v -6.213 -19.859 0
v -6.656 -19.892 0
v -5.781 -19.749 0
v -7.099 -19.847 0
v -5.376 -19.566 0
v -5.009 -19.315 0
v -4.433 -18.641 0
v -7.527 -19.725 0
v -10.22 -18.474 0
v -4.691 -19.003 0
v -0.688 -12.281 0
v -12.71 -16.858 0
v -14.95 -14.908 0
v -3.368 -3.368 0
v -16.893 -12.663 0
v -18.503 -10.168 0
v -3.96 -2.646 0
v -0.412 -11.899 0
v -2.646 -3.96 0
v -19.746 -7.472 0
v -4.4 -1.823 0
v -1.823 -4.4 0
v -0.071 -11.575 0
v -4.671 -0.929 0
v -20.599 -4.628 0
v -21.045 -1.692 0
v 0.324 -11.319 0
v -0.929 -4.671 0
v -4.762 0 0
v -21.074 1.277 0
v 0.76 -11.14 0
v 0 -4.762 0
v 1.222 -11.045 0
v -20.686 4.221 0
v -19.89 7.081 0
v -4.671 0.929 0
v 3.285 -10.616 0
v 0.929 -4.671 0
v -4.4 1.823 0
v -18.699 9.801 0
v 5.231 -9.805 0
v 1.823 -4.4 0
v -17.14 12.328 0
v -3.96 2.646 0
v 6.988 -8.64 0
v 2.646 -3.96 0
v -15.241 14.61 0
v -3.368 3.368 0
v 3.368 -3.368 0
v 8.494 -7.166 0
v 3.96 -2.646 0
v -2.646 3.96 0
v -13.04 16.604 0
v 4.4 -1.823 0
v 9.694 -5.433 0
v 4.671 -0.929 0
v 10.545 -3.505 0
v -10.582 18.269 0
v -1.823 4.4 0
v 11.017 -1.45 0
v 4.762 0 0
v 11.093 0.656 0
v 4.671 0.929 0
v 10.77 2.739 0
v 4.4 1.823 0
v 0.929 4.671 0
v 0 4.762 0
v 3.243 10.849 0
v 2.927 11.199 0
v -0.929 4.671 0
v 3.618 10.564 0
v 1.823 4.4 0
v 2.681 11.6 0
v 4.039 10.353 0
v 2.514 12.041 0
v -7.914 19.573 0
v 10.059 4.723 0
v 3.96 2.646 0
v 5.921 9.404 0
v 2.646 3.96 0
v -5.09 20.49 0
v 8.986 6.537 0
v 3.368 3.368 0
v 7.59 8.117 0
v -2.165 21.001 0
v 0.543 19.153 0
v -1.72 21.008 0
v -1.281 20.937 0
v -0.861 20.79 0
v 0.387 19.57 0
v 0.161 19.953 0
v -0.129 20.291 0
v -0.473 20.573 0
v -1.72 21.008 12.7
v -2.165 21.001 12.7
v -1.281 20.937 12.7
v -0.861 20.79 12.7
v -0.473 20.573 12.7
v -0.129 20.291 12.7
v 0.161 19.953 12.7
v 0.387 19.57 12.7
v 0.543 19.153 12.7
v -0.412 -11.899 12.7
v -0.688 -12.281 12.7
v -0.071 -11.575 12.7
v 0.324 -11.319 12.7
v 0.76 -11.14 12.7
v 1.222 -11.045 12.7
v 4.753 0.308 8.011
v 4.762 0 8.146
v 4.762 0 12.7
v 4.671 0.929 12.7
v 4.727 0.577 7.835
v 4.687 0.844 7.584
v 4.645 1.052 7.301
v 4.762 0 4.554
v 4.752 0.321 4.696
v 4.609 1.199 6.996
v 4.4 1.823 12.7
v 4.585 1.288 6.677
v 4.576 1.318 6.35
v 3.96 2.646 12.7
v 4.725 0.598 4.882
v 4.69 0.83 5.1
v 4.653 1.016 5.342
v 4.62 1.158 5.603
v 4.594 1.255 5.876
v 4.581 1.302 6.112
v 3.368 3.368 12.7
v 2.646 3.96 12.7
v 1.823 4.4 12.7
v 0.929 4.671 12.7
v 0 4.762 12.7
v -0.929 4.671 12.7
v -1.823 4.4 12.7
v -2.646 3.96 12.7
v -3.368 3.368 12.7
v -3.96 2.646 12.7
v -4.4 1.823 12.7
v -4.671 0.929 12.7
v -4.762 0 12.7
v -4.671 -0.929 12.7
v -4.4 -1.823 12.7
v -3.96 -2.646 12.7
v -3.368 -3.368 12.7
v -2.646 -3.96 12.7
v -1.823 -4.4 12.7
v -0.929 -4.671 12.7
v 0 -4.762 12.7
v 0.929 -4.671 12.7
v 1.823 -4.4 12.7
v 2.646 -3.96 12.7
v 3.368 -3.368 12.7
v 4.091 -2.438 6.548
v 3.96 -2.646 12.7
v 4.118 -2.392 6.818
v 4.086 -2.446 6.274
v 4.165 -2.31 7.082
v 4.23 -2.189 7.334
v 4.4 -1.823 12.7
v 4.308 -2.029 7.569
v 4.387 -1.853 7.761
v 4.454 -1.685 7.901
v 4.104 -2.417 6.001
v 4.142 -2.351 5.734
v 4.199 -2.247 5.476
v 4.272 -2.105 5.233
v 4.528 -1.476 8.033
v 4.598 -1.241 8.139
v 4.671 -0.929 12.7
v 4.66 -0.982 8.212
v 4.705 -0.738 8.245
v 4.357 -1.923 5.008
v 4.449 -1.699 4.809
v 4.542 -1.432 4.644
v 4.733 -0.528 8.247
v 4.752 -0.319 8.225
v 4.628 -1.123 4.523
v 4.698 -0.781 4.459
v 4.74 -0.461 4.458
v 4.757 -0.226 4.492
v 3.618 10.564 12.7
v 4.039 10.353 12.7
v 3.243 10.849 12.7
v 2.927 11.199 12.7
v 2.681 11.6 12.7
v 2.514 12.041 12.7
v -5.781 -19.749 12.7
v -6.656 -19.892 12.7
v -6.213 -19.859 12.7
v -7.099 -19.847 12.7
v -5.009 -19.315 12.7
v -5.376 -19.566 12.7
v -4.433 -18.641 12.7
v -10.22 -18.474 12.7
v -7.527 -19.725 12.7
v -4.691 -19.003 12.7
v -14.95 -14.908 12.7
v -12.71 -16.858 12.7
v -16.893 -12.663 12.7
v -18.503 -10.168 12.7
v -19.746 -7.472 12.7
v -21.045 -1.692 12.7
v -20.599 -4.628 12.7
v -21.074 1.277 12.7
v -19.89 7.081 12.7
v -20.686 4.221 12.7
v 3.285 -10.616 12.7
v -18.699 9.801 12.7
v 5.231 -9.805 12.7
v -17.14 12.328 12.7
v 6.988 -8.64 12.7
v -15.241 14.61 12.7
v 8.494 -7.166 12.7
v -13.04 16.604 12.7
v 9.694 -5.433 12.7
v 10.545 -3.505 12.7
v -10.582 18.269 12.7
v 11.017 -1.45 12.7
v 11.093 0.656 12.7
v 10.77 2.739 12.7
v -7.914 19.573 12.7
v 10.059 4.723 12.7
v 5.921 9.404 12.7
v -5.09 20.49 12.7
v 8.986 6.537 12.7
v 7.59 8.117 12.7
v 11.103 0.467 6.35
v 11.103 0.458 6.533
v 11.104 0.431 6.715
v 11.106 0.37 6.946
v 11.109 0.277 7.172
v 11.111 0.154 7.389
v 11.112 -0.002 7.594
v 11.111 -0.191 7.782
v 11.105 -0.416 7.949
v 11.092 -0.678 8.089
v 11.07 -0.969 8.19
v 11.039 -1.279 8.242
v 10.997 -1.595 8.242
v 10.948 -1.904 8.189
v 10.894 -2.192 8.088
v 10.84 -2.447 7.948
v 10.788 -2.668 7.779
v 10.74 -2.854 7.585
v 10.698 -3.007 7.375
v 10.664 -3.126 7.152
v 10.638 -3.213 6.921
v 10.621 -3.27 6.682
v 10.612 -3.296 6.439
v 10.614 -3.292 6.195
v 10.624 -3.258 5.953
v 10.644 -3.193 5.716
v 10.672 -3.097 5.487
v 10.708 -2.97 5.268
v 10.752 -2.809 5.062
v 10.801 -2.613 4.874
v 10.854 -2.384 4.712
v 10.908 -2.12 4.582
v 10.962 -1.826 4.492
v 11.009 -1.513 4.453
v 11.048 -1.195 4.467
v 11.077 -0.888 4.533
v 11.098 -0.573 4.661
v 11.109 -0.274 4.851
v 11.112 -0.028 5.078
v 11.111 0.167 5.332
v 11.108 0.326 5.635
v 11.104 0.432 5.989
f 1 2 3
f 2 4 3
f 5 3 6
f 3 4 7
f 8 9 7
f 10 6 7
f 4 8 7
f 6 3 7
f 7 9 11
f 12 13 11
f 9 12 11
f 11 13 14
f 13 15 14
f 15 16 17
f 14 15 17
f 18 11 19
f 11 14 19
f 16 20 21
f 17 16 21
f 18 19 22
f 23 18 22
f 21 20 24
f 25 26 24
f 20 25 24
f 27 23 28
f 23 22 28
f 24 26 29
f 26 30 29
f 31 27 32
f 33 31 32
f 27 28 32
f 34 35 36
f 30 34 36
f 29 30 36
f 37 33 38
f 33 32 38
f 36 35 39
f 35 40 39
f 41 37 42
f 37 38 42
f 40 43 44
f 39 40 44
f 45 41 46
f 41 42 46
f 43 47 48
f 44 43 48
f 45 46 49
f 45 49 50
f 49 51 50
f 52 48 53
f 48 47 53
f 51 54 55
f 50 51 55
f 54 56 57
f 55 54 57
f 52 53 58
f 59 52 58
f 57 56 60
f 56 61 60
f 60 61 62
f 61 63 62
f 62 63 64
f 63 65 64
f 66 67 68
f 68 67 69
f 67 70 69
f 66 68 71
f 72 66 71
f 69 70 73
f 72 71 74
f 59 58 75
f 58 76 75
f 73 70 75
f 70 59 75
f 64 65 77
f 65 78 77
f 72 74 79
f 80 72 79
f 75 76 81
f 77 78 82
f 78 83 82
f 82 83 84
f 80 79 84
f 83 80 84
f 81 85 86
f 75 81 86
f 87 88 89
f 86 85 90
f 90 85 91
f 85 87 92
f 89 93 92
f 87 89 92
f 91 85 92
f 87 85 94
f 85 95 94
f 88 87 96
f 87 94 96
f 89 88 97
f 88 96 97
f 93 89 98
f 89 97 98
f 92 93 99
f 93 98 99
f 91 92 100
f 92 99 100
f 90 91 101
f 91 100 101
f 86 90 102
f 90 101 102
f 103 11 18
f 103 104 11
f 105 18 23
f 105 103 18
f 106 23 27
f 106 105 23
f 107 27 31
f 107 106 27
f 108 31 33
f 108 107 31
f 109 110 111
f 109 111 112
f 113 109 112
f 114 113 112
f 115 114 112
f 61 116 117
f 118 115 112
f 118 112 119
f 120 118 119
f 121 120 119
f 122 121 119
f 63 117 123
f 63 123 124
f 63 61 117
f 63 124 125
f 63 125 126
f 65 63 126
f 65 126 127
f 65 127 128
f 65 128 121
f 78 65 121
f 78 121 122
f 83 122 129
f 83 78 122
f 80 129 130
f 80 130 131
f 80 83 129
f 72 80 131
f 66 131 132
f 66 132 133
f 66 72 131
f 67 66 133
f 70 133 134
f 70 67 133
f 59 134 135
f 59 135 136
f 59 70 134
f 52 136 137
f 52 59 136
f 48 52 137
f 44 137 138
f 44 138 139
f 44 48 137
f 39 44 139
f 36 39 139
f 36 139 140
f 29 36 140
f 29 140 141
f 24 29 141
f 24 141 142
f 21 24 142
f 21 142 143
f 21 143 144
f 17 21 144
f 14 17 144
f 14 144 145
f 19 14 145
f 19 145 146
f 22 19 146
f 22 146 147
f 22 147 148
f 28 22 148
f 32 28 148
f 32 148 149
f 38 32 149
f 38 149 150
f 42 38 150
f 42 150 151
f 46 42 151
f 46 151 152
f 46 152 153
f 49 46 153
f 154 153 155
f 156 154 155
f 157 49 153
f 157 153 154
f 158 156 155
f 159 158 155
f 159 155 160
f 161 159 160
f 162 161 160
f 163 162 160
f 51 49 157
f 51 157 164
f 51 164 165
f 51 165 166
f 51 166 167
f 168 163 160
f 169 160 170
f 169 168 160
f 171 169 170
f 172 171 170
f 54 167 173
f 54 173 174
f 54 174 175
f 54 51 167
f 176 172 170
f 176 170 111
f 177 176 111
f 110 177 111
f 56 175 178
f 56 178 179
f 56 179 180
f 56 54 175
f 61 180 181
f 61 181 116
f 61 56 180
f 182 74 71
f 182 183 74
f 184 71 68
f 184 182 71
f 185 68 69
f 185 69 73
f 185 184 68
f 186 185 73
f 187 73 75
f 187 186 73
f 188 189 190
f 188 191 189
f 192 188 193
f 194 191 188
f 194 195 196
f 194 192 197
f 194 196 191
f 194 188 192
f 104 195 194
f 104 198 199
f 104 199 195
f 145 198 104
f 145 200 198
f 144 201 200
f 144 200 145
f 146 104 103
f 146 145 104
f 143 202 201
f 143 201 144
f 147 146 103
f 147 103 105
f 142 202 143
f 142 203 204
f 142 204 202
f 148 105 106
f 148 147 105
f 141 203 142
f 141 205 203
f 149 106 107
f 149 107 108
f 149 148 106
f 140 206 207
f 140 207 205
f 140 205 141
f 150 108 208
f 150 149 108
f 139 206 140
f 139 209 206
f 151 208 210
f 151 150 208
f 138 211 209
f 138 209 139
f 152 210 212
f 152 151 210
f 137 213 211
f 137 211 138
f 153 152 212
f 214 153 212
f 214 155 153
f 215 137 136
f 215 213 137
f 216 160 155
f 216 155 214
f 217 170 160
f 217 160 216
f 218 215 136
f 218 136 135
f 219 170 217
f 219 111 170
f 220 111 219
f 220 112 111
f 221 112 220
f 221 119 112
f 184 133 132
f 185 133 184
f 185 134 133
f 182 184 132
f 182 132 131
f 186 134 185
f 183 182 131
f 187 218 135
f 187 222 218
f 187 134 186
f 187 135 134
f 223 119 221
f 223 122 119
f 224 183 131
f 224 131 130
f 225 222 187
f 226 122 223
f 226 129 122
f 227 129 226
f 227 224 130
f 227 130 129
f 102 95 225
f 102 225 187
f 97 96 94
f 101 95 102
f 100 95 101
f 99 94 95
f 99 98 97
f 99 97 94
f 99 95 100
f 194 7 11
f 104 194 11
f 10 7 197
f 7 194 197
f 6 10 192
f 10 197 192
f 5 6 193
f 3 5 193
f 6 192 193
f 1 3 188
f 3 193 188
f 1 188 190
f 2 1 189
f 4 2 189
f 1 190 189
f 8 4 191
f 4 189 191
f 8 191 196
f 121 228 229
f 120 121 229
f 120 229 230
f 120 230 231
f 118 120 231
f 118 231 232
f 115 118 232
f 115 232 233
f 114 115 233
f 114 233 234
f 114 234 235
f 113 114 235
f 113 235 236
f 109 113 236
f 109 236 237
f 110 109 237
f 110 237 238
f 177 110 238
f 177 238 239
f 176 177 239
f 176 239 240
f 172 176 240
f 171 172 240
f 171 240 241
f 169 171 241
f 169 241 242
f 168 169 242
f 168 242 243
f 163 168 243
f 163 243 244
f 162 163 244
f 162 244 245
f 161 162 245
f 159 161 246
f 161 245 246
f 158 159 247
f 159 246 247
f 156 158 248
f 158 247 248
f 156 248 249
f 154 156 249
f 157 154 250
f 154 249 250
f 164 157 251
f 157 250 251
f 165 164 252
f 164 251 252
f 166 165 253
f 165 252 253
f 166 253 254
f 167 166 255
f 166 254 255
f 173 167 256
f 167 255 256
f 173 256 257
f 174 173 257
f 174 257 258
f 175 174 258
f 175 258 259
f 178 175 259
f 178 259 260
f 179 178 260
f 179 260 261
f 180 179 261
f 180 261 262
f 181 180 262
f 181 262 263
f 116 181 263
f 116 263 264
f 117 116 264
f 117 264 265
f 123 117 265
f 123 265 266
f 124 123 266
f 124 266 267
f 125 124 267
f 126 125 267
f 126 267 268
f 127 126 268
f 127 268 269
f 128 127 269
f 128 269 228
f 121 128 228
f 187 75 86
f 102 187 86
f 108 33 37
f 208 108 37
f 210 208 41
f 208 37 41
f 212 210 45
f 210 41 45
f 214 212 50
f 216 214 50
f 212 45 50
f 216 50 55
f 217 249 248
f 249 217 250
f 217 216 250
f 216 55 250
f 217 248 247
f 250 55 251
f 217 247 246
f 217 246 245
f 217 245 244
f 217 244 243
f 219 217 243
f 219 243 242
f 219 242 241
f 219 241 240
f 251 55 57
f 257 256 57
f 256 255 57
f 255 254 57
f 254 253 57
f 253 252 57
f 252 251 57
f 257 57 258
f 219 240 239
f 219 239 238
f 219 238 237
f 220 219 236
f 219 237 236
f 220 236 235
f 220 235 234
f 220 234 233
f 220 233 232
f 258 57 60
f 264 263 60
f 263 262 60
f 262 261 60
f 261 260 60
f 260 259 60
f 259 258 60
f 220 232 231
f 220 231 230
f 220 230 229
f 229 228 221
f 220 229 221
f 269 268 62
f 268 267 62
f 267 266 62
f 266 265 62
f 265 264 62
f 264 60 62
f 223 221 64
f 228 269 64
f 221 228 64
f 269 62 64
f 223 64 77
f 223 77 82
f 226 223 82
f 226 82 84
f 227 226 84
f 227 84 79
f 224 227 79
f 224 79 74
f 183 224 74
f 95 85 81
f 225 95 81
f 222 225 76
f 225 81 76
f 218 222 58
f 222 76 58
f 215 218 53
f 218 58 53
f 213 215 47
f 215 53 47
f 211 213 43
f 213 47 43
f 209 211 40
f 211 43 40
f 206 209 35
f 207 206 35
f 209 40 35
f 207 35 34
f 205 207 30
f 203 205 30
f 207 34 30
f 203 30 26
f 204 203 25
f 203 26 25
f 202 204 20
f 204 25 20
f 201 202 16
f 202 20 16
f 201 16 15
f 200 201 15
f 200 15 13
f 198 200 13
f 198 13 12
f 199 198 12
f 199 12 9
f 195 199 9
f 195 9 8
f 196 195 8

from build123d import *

# Parameters (mm, degrees)
SKETCH1_R                   = 4.7625
BOSS_EXTRUDE1_DEPTH         = 12.7
FILLET1_R                   = 2.54
F_10_24_TAPPED_HOLE1_REACH  = 41.709
F_10_24_TAPPED_HOLE1_BORE_R = 1.89865


with BuildPart() as part:
    # Sketch1 → Boss-Extrude1 (new body)
    with BuildSketch(Plane.XY):
        with BuildLine():
            Line((-5.46431709, -20.393109008), (0, -11.1125))
            ThreePointArc((0, -11.1125), (11.017431022, -1.450472311), (2.876126639, 10.733850745))
            Line((2.876126639, 10.733850745), (0, 21.1125))
            ThreePointArc((0, 21.1125), (-20.931879636, 2.755734233), (-5.46431709, -20.393109008))
        make_face()
        Circle(SKETCH1_R, mode=Mode.SUBTRACT)
    extrude(amount=BOSS_EXTRUDE1_DEPTH)

    # Fillet1
    fillet1_edges = [part.edges().sort_by_distance(p)[0] for p in [
        (2.876126639, 10.733850745, 6.35),
        (0, -11.1125, 6.35),
        (-5.46431709, -20.393109008, 6.35),
        (0, 21.1125, 6.35),
    ]]
    fillet(fillet1_edges, radius=FILLET1_R)

    # #10-24 Tapped Hole1 bore (on position points) → #10-24 Tapped Hole1 (cut, up to next)
    with BuildSketch(Plane(origin=(11.019222387, -1.436799975, 6.35), x_dir=(0.129295835761, 0.99160606435, 0), z_dir=(0.99160606435, -0.129295835761, 0)), mode=Mode.PRIVATE) as f_10_24_tapped_hole1_sk1:
        with Locations((1e-09, 0)):
            Circle(F_10_24_TAPPED_HOLE1_BORE_R)
    f_10_24_tapped_hole1_tool1 = extrude(f_10_24_tapped_hole1_sk1.sketch, amount=-F_10_24_TAPPED_HOLE1_REACH, mode=Mode.PRIVATE) & part.part
    add(f_10_24_tapped_hole1_tool1.solids().sort_by_distance((11.019222, -1.4368, 6.35))[0], mode=Mode.SUBTRACT)


solid = part.part
